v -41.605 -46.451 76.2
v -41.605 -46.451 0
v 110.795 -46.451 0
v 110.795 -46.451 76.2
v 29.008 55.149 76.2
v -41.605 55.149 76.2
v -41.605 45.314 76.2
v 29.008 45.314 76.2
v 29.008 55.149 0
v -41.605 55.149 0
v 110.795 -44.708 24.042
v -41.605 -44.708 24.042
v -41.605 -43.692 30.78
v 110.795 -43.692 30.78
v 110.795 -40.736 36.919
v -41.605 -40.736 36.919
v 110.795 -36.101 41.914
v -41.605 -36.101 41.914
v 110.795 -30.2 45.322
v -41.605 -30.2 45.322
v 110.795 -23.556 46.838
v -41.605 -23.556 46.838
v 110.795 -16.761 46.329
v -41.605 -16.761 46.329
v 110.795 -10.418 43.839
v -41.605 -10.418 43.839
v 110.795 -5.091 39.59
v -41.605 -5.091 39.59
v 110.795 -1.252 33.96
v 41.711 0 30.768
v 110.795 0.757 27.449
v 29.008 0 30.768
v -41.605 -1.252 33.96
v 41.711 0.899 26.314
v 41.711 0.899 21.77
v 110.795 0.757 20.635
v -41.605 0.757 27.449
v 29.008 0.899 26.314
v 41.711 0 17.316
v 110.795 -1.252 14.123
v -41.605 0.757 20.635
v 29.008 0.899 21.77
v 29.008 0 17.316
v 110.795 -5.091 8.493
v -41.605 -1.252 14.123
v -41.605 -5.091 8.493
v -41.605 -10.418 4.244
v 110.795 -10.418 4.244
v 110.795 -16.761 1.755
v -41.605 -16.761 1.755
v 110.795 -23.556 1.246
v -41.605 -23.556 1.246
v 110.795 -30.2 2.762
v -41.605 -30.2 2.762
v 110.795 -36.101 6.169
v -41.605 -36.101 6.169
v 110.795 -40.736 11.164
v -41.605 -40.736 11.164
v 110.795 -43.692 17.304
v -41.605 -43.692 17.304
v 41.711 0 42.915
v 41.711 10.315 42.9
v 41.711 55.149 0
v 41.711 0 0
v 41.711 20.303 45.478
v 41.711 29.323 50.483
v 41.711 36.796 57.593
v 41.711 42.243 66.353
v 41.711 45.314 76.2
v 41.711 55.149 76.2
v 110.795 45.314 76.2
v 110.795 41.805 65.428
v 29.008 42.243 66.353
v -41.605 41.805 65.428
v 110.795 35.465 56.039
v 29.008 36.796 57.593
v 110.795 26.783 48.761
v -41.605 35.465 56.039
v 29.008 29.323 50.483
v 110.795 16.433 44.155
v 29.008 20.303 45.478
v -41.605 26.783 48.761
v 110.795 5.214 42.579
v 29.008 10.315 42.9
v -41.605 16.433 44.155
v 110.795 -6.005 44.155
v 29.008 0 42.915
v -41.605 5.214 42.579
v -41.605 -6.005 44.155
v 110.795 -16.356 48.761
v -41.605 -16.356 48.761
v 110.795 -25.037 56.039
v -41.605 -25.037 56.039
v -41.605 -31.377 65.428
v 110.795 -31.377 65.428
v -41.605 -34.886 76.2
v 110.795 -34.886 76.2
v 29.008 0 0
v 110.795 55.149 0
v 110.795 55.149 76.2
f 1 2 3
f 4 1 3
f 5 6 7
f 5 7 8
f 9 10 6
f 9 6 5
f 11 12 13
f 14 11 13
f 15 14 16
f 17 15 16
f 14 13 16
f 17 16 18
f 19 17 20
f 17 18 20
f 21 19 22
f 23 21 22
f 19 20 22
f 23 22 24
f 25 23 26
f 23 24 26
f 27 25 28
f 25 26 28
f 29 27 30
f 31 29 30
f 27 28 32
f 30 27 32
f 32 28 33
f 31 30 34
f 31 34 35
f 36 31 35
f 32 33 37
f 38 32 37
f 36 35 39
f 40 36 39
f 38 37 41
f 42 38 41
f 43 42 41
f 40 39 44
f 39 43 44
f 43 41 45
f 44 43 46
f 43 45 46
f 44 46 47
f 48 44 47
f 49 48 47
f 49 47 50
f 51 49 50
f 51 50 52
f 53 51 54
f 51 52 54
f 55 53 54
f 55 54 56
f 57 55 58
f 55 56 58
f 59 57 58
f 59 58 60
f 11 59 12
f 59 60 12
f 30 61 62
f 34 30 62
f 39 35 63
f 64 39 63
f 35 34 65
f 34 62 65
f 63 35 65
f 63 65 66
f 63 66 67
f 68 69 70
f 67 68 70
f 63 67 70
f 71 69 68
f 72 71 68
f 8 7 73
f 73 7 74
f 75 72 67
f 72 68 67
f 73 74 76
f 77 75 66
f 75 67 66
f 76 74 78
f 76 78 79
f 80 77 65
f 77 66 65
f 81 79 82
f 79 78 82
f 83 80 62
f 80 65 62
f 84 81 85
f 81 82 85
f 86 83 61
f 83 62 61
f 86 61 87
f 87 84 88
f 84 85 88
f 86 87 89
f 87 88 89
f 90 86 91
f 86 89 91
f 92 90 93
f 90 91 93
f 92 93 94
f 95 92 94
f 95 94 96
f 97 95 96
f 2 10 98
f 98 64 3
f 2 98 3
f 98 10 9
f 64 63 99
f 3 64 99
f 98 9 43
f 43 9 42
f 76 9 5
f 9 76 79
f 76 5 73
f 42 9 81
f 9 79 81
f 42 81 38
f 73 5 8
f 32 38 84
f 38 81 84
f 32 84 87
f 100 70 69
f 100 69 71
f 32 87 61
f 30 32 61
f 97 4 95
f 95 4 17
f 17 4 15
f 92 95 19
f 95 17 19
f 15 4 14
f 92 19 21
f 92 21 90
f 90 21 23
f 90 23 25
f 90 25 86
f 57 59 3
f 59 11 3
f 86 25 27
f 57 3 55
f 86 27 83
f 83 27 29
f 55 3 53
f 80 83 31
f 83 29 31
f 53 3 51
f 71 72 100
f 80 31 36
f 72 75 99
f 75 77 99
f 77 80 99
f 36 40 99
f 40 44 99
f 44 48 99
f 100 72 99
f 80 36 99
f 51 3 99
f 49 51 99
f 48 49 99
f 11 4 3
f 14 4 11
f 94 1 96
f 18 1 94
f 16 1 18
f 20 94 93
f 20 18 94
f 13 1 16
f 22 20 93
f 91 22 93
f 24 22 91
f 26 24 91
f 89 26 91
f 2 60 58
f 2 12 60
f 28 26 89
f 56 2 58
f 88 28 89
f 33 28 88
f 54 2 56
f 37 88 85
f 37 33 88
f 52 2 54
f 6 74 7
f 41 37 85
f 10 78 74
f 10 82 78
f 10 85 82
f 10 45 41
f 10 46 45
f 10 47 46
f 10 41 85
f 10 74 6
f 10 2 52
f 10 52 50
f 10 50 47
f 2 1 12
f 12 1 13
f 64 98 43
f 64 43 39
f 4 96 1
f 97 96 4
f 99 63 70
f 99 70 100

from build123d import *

# Parameters (mm, degrees)
F0_W     = 152.4
F0_H     = 101.6
F1_DEPTH = 76.2
F3_DEPTH = 152.654
F4_W     = 12.7030066214
F4_H     = 9.8352176327
F4_H_2   = 45.31371966
F5_DEPTH = 115.316
F6_R     = 22.86
F7_DEPTH = 193.04


with BuildPart() as f1:
    # F0 (on Top) → F1 (new body)
    with BuildSketch(Plane.XY):
        with Locations((34.5954637319, 4.3489372927)):
            Rectangle(F0_W, F0_H)
    extrude(amount=F1_DEPTH)

    # F2 (on face) → F3 (cut)
    with BuildSketch(Plane(origin=(-41.6045362681, 0, 0), x_dir=(0, -1, 0), z_dir=(-1, 0, 0))):
        with BuildLine():
            Line((34.8858758807, 76.2), (-45.31371966, 76.2))
            ThreePointArc((-45.31371966, 76.2), (-5.2139218897, 42.5794624331), (34.8858758807, 76.2))
        make_face()
    extrude(amount=-F3_DEPTH, mode=Mode.SUBTRACT)

    # F4 (on face) → F5 (cut)
    with BuildSketch(Plane.XY.offset(76.2)):
        with Locations((35.3598685469, 50.2313284764)):
            Rectangle(F4_W, F4_H)
        with Locations((35.3598685469, 22.65685983)):
            Rectangle(F4_W, F4_H_2)
    extrude(amount=-F5_DEPTH, mode=Mode.SUBTRACT)

    # F6 (on face) → F7 (cut)
    with BuildSketch(Plane(origin=(-41.6045362681, 0, 0), x_dir=(0, -1, 0), z_dir=(-1, 0, 0))):
        with Locations((21.8480825203, 24.0417348414)):
            Circle(F6_R)
    extrude(amount=-F7_DEPTH, mode=Mode.SUBTRACT)


solid = f1.part
